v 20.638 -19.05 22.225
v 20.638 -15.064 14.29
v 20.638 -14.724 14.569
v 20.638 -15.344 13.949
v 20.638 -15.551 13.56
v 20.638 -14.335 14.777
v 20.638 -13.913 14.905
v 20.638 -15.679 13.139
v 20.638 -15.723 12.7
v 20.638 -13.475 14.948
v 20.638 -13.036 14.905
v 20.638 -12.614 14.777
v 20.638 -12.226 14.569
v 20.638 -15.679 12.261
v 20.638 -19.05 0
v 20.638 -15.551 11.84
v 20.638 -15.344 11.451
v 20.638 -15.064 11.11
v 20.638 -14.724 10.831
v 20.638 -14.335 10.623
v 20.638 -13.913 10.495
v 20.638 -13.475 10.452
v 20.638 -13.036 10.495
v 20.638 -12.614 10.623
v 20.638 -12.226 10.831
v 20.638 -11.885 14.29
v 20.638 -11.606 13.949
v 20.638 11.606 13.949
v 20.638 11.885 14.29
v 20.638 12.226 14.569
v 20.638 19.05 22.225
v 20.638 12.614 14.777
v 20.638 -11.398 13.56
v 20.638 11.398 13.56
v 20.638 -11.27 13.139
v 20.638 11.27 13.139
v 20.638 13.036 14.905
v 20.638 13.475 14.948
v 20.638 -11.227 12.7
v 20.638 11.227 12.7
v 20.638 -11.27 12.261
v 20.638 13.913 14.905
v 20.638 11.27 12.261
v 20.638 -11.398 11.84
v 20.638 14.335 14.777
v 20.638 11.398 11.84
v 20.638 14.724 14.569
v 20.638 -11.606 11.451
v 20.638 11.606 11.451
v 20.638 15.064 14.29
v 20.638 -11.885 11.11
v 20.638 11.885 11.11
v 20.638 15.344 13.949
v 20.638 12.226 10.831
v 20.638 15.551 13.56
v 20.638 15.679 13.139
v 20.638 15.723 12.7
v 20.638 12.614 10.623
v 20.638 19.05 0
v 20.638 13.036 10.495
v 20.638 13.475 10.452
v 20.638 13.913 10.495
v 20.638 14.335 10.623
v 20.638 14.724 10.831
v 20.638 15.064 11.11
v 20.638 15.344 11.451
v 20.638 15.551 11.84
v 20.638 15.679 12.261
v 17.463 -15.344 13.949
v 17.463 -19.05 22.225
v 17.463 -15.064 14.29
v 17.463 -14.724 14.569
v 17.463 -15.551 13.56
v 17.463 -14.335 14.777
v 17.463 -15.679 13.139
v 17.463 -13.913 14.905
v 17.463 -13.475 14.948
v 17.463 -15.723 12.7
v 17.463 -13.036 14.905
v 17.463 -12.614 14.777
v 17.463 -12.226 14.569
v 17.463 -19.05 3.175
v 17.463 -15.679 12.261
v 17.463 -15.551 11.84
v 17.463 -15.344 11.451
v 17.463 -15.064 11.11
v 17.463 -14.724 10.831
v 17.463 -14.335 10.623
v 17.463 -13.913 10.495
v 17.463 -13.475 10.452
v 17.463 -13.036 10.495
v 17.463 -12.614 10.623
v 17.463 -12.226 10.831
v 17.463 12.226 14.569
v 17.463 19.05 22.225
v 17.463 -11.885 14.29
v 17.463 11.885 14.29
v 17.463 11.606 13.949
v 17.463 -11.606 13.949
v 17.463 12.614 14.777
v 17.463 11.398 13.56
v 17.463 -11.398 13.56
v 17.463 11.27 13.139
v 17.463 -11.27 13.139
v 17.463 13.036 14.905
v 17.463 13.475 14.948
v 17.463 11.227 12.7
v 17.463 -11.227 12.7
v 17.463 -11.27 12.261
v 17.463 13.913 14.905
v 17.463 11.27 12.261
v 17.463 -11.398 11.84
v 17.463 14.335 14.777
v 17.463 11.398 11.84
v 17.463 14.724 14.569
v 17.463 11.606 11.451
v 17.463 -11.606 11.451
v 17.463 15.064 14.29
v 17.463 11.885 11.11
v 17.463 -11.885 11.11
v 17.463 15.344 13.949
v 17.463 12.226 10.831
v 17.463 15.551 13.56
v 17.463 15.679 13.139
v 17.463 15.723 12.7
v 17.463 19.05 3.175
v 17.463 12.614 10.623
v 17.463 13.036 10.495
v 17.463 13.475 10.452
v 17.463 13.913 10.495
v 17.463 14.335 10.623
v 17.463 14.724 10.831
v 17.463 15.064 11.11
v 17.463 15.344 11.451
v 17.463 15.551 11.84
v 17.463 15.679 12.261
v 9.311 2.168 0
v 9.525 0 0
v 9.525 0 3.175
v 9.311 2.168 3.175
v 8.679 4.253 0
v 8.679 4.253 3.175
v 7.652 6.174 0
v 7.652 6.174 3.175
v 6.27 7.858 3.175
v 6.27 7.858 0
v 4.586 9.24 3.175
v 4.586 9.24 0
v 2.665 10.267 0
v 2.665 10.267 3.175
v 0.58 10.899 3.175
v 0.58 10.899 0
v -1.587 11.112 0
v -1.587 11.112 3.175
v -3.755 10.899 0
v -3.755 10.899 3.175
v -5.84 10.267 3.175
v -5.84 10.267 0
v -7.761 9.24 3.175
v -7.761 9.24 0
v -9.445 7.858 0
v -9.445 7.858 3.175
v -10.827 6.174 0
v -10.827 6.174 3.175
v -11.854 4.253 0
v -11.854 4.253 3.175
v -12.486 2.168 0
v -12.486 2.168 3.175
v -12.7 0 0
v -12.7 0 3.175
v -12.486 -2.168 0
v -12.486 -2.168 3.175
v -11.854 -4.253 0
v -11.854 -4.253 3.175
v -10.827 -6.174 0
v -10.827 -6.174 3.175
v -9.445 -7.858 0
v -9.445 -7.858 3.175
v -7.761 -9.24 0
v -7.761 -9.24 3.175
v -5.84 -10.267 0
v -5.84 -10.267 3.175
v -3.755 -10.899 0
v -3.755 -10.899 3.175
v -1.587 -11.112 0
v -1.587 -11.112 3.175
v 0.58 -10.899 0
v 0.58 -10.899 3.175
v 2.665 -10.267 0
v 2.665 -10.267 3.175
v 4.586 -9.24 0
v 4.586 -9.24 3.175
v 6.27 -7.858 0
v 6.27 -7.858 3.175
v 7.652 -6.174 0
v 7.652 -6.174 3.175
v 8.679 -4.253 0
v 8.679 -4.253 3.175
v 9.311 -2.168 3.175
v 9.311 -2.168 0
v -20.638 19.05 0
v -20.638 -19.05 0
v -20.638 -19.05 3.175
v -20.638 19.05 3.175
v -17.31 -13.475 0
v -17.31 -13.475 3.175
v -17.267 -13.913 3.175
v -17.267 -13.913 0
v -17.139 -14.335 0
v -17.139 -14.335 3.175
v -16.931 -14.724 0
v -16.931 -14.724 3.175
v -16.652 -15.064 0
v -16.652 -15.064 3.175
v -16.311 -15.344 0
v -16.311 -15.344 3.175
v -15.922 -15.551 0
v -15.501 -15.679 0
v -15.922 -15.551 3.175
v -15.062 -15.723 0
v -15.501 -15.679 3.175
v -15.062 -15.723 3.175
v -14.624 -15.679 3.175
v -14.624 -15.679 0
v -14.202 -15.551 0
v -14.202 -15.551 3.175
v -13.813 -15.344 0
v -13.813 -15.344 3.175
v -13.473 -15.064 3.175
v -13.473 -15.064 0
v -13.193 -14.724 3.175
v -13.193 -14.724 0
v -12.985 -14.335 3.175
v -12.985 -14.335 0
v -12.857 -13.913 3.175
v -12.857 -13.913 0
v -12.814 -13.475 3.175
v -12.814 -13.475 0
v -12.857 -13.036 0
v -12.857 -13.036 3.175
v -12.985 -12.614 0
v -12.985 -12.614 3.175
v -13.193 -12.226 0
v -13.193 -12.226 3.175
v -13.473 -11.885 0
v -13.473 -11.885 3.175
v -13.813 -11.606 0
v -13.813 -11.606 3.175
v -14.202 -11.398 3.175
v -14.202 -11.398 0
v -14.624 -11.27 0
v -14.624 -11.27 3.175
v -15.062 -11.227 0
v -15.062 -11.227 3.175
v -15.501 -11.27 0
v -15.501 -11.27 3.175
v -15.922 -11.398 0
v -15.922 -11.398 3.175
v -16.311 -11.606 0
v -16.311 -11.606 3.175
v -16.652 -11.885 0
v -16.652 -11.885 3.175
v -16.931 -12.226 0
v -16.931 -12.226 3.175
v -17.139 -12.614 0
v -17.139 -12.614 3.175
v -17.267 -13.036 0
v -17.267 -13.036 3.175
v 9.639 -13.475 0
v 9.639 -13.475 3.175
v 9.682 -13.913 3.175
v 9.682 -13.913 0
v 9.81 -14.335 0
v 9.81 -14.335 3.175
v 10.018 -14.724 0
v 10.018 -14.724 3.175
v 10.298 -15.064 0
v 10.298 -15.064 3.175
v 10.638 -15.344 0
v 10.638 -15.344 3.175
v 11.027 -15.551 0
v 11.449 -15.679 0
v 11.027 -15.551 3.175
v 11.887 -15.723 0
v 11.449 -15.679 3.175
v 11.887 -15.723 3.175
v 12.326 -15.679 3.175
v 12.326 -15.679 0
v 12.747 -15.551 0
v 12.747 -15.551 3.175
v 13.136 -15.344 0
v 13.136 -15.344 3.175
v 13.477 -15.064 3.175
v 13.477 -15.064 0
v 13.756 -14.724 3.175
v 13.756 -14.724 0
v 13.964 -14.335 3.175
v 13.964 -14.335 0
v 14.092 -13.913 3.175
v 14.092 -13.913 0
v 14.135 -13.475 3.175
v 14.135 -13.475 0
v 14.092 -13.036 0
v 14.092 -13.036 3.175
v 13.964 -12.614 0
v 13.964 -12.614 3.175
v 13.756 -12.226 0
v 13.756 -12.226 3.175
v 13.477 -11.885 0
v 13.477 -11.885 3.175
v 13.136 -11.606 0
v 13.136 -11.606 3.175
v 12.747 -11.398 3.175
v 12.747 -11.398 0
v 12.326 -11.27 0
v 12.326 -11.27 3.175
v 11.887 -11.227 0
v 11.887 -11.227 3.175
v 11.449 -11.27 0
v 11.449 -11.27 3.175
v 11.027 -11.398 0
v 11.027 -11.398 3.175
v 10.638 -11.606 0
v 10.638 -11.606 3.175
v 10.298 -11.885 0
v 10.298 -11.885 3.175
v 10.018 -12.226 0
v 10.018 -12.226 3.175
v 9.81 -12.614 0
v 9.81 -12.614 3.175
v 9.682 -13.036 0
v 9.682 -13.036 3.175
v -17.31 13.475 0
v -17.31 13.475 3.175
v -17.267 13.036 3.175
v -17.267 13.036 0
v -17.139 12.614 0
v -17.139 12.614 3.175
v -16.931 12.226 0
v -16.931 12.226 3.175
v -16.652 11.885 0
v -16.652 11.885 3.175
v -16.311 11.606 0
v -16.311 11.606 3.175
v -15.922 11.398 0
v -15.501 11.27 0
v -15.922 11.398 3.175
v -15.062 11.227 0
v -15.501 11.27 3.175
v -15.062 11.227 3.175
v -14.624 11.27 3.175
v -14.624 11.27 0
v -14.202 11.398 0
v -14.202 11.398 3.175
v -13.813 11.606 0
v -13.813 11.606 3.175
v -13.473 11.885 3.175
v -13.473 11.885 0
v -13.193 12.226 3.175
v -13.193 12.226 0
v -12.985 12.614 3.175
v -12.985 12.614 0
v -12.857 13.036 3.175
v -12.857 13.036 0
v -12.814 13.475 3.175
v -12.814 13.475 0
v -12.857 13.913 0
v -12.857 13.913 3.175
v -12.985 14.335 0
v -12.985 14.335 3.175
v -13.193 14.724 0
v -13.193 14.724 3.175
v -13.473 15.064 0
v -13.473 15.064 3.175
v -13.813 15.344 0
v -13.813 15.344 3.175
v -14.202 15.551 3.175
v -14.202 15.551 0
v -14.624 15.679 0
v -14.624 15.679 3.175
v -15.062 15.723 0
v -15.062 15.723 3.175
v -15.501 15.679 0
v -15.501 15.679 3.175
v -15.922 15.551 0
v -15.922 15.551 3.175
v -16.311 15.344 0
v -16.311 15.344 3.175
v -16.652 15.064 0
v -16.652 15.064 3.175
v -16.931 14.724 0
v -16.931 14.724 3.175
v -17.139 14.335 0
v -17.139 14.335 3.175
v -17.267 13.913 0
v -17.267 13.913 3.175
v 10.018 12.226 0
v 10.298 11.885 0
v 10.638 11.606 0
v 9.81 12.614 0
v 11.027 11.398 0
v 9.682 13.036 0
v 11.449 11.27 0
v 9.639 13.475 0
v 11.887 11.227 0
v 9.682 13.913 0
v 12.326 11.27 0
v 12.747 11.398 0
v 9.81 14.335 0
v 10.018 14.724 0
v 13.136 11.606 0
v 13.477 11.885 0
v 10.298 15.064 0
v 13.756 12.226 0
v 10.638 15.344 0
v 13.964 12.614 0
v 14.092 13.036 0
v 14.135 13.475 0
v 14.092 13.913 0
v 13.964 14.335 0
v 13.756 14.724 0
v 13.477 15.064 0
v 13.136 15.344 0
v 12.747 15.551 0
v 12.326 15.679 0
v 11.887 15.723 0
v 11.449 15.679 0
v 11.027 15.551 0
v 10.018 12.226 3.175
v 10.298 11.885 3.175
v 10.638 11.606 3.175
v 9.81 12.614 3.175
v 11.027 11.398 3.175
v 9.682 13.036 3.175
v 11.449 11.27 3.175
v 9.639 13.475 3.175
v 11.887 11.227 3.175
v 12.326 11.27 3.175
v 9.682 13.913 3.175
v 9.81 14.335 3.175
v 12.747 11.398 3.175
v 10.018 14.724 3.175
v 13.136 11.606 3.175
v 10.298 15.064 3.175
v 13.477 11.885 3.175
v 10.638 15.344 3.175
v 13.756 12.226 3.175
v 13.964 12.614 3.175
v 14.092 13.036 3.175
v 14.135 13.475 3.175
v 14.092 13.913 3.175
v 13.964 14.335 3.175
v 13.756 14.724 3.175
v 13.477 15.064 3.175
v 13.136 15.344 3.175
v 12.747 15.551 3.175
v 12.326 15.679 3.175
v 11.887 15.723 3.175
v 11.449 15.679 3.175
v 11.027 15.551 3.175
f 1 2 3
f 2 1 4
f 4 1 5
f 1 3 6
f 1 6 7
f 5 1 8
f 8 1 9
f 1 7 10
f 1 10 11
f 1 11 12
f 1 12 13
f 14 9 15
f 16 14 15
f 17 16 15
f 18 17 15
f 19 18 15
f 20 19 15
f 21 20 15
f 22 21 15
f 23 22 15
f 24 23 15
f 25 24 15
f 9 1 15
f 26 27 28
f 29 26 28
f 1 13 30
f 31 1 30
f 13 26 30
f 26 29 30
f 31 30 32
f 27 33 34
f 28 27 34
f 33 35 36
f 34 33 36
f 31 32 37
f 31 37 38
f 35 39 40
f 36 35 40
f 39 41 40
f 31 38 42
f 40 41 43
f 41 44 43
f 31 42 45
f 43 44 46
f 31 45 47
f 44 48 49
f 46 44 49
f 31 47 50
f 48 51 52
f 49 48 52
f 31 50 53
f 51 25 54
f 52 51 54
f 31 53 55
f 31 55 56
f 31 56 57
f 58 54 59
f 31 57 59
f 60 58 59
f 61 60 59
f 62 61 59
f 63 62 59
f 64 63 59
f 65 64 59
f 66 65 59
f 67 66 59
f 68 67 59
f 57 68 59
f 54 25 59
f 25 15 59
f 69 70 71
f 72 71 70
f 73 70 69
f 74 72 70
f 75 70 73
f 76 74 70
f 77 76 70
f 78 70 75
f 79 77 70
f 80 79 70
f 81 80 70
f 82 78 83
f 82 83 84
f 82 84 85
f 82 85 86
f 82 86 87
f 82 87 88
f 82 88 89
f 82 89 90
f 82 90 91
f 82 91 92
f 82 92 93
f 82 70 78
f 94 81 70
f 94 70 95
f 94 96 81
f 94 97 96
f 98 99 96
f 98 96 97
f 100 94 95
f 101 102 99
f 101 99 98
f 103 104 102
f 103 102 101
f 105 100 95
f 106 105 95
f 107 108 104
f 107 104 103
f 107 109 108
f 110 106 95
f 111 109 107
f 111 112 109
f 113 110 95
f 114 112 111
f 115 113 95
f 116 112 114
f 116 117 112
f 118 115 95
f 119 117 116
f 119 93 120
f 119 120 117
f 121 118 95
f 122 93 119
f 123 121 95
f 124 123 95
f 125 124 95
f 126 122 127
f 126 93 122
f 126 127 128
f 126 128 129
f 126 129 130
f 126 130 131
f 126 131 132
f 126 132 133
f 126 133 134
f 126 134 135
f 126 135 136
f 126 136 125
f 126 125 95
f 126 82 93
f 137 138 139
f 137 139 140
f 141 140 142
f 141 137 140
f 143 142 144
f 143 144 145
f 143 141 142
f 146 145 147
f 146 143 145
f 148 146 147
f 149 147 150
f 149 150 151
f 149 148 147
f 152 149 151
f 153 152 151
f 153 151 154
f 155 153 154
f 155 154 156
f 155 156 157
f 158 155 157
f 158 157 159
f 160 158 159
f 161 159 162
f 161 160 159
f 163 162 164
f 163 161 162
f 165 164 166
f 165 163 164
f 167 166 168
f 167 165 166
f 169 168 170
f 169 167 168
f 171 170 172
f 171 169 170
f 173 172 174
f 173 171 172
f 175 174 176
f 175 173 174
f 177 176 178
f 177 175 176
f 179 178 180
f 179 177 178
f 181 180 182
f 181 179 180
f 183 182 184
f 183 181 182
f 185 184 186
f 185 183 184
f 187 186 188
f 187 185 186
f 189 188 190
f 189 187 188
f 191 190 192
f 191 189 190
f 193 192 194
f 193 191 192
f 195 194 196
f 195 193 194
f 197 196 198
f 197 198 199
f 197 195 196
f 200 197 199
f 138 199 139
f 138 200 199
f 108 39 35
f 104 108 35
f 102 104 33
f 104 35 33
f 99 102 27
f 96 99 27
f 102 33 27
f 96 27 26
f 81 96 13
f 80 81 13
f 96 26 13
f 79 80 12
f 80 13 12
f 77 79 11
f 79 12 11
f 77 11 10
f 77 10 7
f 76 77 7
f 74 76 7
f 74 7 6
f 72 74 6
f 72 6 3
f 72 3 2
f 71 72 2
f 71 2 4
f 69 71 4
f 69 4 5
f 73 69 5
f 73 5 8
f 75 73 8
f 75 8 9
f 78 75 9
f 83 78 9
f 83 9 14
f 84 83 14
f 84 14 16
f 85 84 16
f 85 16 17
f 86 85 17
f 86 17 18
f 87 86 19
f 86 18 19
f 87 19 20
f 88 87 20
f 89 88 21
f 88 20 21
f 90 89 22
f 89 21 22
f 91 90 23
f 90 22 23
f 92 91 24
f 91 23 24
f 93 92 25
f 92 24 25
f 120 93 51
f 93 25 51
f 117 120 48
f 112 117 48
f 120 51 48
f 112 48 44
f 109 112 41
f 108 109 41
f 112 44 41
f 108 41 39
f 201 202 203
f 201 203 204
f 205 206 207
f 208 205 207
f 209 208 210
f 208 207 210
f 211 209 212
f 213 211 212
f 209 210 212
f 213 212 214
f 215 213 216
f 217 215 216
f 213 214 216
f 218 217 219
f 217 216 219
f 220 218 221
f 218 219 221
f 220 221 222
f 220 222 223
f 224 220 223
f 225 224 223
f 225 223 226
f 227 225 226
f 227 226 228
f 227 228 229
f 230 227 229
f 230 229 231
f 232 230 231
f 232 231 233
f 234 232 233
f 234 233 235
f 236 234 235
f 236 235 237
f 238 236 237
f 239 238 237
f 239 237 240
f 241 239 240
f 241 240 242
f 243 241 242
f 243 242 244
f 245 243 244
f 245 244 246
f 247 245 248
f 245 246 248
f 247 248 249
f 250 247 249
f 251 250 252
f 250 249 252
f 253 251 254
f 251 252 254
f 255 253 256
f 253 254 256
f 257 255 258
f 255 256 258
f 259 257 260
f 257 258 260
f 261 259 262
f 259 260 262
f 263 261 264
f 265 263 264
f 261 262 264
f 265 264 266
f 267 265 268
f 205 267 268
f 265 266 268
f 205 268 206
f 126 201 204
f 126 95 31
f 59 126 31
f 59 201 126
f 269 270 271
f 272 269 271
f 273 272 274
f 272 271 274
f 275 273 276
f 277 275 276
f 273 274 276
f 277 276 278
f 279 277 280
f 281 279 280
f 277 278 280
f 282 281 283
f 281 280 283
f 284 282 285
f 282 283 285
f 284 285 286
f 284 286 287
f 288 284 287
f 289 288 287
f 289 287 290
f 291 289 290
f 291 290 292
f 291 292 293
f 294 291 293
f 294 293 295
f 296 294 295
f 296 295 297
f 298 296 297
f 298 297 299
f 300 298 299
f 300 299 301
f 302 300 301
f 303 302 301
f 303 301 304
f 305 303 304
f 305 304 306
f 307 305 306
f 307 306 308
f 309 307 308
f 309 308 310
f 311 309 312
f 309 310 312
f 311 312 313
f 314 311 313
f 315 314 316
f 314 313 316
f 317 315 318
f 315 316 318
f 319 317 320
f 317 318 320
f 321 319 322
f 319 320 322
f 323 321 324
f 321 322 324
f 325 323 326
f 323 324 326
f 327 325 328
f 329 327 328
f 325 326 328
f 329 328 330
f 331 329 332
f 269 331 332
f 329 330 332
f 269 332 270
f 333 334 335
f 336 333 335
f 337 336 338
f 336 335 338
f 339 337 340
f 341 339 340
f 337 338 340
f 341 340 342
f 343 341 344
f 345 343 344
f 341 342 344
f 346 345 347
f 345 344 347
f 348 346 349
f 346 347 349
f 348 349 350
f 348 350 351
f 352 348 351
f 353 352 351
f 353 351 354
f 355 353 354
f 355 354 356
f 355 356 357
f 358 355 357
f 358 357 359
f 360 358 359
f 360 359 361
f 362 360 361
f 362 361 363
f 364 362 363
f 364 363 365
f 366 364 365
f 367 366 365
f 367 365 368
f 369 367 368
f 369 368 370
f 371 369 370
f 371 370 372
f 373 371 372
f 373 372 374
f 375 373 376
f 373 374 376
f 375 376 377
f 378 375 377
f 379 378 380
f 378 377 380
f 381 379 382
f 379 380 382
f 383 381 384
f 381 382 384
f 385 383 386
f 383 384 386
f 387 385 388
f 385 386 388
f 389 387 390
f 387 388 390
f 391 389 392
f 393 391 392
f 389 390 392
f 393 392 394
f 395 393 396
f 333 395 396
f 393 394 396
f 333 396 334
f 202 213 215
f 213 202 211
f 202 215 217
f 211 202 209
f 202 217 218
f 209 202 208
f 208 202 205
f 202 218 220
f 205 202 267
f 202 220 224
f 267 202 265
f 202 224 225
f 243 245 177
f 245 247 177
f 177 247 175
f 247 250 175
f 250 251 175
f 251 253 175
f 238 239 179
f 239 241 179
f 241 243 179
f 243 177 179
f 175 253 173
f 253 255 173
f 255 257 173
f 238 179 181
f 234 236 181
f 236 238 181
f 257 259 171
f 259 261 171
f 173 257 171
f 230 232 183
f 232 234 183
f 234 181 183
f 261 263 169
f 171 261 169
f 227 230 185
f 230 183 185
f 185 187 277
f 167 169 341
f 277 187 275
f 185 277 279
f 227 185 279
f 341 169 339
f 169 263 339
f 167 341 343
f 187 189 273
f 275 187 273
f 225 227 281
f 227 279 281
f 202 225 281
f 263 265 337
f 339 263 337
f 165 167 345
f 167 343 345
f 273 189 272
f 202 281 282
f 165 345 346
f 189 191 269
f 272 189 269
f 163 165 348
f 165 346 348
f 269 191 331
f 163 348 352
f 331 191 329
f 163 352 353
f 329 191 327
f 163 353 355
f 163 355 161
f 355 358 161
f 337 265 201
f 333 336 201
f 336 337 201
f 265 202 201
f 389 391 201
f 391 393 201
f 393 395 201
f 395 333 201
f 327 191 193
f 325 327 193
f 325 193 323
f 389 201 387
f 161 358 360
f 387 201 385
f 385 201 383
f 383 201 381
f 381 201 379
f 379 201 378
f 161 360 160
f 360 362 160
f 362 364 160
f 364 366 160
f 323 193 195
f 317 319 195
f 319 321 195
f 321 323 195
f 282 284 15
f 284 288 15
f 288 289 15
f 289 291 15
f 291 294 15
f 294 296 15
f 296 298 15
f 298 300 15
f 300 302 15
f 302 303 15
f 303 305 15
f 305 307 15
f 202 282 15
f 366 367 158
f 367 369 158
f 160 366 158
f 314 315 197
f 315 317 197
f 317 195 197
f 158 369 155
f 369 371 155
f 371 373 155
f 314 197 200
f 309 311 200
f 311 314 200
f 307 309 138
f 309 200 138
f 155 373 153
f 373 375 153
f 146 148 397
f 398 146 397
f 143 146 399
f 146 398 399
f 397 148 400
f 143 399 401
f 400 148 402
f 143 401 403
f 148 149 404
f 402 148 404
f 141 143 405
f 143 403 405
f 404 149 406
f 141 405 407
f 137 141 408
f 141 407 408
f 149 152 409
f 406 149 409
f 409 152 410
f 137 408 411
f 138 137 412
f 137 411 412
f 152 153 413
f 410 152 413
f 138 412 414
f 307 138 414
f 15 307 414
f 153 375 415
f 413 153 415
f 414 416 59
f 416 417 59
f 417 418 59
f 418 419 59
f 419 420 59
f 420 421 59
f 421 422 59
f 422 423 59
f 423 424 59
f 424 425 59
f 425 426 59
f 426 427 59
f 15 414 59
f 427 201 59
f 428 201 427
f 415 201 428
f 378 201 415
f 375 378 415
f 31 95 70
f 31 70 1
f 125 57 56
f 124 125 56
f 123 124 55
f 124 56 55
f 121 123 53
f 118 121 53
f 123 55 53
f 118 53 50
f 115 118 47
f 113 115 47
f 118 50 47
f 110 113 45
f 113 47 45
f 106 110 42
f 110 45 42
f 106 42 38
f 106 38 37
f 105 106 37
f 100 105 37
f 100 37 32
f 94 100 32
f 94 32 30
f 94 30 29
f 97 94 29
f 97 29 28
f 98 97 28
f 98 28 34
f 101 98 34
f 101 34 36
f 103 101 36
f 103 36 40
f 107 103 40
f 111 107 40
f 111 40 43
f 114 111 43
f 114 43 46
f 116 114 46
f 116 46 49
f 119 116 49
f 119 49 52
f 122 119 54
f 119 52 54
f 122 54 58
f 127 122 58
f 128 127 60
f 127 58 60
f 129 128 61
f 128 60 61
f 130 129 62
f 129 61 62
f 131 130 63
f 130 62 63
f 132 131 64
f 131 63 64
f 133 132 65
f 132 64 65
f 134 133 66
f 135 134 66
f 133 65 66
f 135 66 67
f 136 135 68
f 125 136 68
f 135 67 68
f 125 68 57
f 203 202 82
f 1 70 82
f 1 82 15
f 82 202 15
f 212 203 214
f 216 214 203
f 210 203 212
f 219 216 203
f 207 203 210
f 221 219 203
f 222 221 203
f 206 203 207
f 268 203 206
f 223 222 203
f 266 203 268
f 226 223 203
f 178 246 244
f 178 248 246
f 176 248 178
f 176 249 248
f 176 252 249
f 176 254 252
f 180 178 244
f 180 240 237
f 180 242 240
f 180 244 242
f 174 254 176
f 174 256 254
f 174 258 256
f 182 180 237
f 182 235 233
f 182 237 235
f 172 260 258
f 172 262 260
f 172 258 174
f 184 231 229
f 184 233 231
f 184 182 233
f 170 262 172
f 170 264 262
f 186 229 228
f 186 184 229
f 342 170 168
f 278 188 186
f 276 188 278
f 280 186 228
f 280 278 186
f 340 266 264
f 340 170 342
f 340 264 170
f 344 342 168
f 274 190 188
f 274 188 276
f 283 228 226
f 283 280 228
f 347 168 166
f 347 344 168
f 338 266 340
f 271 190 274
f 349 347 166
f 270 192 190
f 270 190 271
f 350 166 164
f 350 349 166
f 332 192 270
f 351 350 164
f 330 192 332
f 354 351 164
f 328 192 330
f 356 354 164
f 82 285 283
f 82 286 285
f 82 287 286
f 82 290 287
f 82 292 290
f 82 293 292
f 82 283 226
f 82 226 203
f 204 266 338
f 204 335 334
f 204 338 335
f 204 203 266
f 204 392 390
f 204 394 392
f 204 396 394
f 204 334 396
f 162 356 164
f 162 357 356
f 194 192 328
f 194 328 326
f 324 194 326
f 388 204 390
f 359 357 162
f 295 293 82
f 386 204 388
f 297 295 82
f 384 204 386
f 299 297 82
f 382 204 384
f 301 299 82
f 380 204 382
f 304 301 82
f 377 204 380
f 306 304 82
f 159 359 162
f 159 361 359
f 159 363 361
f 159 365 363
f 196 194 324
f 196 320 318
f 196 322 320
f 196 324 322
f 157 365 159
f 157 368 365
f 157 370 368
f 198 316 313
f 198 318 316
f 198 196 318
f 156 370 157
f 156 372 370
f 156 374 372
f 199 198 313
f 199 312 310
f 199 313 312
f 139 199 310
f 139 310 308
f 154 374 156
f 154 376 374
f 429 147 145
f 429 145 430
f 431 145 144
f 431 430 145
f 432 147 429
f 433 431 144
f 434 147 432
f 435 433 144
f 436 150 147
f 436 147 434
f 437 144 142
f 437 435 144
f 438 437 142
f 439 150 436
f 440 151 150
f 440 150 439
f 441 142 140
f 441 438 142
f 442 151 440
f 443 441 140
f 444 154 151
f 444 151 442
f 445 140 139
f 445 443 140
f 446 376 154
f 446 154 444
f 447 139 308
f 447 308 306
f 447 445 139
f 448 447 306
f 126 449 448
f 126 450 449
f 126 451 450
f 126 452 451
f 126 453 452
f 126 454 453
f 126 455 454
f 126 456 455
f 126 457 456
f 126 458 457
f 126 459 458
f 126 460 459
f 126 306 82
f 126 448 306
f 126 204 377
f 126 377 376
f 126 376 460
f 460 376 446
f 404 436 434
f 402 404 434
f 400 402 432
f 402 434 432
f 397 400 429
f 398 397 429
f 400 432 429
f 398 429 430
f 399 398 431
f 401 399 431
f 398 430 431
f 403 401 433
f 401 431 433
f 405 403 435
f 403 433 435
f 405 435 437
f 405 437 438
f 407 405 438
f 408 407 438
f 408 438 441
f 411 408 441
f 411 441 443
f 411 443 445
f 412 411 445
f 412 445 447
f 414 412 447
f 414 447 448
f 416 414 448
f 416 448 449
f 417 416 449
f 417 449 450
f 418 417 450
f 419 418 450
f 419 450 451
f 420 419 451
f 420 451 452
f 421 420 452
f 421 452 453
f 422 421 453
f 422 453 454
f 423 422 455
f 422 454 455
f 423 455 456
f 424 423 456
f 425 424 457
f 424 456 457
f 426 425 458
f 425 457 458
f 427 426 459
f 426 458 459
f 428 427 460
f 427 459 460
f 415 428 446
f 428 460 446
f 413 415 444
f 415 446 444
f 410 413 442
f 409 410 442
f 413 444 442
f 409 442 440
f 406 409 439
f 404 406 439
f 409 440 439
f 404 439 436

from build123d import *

# Parameters (mm, degrees)
F0_W     = 3.175
F0_H     = 38.1
F1_DEPTH = 22.225
F0_W_2   = 38.1
F0_R     = 11.1125
F2_DEPTH = 3.175
F4_D     = 4.4958
F5_D     = 4.4958
F6_D     = 4.4958
F7_D     = 4.4958
F8_D     = 4.4958
F9_D     = 4.4958


with BuildPart() as f1:
    # F0 (on Top) → F1 (new body)
    with BuildSketch(Plane.XY):
        with Locations((19.05, 0)):
            Rectangle(F0_W, F0_H)
    extrude(amount=F1_DEPTH)

    # F0 (on Top) → F2 (join)
    with BuildSketch(Plane.XY):
        with Locations((-1.5875, 0)):
            Rectangle(F0_W_2, F0_H)
        with Locations((-1.5875, 0)):
            Circle(F0_R, mode=Mode.SUBTRACT)
    extrude(amount=F2_DEPTH)

    # F4 (through all)
    with Locations(Plane(origin=(0, 0, 0), x_dir=(1, 0, 0), z_dir=(0, 0, -1))):
        with Locations((-15.0622, 13.4747)):
            Hole(F4_D / 2)

    # F5 (through all)
    with Locations(Plane(origin=(0, 0, 0), x_dir=(1, 0, 0), z_dir=(0, 0, -1))):
        with Locations((-15.0622, -13.4747)):
            Hole(F5_D / 2)

    # F6 (through all)
    with Locations(Plane(origin=(0, 0, 0), x_dir=(1, 0, 0), z_dir=(0, 0, -1))):
        with Locations((11.8872, -13.4747)):
            Hole(F6_D / 2)

    # F7 (through all)
    with Locations(Plane(origin=(0, 0, 0), x_dir=(1, 0, 0), z_dir=(0, 0, -1))):
        with Locations((11.8872, 13.4747)):
            Hole(F7_D / 2)

    # F8 (through all)
    with Locations(Plane(origin=(17.4625, 0, 0), x_dir=(0, -1, 0), z_dir=(-1, 0, 0))):
        with Locations((-13.4747, 12.7)):
            Hole(F8_D / 2)

    # F9 (through all)
    with Locations(Plane(origin=(17.4625, 0, 0), x_dir=(0, -1, 0), z_dir=(-1, 0, 0))):
        with Locations((13.4747, 12.7)):
            Hole(F9_D / 2)


solid = f1.part
